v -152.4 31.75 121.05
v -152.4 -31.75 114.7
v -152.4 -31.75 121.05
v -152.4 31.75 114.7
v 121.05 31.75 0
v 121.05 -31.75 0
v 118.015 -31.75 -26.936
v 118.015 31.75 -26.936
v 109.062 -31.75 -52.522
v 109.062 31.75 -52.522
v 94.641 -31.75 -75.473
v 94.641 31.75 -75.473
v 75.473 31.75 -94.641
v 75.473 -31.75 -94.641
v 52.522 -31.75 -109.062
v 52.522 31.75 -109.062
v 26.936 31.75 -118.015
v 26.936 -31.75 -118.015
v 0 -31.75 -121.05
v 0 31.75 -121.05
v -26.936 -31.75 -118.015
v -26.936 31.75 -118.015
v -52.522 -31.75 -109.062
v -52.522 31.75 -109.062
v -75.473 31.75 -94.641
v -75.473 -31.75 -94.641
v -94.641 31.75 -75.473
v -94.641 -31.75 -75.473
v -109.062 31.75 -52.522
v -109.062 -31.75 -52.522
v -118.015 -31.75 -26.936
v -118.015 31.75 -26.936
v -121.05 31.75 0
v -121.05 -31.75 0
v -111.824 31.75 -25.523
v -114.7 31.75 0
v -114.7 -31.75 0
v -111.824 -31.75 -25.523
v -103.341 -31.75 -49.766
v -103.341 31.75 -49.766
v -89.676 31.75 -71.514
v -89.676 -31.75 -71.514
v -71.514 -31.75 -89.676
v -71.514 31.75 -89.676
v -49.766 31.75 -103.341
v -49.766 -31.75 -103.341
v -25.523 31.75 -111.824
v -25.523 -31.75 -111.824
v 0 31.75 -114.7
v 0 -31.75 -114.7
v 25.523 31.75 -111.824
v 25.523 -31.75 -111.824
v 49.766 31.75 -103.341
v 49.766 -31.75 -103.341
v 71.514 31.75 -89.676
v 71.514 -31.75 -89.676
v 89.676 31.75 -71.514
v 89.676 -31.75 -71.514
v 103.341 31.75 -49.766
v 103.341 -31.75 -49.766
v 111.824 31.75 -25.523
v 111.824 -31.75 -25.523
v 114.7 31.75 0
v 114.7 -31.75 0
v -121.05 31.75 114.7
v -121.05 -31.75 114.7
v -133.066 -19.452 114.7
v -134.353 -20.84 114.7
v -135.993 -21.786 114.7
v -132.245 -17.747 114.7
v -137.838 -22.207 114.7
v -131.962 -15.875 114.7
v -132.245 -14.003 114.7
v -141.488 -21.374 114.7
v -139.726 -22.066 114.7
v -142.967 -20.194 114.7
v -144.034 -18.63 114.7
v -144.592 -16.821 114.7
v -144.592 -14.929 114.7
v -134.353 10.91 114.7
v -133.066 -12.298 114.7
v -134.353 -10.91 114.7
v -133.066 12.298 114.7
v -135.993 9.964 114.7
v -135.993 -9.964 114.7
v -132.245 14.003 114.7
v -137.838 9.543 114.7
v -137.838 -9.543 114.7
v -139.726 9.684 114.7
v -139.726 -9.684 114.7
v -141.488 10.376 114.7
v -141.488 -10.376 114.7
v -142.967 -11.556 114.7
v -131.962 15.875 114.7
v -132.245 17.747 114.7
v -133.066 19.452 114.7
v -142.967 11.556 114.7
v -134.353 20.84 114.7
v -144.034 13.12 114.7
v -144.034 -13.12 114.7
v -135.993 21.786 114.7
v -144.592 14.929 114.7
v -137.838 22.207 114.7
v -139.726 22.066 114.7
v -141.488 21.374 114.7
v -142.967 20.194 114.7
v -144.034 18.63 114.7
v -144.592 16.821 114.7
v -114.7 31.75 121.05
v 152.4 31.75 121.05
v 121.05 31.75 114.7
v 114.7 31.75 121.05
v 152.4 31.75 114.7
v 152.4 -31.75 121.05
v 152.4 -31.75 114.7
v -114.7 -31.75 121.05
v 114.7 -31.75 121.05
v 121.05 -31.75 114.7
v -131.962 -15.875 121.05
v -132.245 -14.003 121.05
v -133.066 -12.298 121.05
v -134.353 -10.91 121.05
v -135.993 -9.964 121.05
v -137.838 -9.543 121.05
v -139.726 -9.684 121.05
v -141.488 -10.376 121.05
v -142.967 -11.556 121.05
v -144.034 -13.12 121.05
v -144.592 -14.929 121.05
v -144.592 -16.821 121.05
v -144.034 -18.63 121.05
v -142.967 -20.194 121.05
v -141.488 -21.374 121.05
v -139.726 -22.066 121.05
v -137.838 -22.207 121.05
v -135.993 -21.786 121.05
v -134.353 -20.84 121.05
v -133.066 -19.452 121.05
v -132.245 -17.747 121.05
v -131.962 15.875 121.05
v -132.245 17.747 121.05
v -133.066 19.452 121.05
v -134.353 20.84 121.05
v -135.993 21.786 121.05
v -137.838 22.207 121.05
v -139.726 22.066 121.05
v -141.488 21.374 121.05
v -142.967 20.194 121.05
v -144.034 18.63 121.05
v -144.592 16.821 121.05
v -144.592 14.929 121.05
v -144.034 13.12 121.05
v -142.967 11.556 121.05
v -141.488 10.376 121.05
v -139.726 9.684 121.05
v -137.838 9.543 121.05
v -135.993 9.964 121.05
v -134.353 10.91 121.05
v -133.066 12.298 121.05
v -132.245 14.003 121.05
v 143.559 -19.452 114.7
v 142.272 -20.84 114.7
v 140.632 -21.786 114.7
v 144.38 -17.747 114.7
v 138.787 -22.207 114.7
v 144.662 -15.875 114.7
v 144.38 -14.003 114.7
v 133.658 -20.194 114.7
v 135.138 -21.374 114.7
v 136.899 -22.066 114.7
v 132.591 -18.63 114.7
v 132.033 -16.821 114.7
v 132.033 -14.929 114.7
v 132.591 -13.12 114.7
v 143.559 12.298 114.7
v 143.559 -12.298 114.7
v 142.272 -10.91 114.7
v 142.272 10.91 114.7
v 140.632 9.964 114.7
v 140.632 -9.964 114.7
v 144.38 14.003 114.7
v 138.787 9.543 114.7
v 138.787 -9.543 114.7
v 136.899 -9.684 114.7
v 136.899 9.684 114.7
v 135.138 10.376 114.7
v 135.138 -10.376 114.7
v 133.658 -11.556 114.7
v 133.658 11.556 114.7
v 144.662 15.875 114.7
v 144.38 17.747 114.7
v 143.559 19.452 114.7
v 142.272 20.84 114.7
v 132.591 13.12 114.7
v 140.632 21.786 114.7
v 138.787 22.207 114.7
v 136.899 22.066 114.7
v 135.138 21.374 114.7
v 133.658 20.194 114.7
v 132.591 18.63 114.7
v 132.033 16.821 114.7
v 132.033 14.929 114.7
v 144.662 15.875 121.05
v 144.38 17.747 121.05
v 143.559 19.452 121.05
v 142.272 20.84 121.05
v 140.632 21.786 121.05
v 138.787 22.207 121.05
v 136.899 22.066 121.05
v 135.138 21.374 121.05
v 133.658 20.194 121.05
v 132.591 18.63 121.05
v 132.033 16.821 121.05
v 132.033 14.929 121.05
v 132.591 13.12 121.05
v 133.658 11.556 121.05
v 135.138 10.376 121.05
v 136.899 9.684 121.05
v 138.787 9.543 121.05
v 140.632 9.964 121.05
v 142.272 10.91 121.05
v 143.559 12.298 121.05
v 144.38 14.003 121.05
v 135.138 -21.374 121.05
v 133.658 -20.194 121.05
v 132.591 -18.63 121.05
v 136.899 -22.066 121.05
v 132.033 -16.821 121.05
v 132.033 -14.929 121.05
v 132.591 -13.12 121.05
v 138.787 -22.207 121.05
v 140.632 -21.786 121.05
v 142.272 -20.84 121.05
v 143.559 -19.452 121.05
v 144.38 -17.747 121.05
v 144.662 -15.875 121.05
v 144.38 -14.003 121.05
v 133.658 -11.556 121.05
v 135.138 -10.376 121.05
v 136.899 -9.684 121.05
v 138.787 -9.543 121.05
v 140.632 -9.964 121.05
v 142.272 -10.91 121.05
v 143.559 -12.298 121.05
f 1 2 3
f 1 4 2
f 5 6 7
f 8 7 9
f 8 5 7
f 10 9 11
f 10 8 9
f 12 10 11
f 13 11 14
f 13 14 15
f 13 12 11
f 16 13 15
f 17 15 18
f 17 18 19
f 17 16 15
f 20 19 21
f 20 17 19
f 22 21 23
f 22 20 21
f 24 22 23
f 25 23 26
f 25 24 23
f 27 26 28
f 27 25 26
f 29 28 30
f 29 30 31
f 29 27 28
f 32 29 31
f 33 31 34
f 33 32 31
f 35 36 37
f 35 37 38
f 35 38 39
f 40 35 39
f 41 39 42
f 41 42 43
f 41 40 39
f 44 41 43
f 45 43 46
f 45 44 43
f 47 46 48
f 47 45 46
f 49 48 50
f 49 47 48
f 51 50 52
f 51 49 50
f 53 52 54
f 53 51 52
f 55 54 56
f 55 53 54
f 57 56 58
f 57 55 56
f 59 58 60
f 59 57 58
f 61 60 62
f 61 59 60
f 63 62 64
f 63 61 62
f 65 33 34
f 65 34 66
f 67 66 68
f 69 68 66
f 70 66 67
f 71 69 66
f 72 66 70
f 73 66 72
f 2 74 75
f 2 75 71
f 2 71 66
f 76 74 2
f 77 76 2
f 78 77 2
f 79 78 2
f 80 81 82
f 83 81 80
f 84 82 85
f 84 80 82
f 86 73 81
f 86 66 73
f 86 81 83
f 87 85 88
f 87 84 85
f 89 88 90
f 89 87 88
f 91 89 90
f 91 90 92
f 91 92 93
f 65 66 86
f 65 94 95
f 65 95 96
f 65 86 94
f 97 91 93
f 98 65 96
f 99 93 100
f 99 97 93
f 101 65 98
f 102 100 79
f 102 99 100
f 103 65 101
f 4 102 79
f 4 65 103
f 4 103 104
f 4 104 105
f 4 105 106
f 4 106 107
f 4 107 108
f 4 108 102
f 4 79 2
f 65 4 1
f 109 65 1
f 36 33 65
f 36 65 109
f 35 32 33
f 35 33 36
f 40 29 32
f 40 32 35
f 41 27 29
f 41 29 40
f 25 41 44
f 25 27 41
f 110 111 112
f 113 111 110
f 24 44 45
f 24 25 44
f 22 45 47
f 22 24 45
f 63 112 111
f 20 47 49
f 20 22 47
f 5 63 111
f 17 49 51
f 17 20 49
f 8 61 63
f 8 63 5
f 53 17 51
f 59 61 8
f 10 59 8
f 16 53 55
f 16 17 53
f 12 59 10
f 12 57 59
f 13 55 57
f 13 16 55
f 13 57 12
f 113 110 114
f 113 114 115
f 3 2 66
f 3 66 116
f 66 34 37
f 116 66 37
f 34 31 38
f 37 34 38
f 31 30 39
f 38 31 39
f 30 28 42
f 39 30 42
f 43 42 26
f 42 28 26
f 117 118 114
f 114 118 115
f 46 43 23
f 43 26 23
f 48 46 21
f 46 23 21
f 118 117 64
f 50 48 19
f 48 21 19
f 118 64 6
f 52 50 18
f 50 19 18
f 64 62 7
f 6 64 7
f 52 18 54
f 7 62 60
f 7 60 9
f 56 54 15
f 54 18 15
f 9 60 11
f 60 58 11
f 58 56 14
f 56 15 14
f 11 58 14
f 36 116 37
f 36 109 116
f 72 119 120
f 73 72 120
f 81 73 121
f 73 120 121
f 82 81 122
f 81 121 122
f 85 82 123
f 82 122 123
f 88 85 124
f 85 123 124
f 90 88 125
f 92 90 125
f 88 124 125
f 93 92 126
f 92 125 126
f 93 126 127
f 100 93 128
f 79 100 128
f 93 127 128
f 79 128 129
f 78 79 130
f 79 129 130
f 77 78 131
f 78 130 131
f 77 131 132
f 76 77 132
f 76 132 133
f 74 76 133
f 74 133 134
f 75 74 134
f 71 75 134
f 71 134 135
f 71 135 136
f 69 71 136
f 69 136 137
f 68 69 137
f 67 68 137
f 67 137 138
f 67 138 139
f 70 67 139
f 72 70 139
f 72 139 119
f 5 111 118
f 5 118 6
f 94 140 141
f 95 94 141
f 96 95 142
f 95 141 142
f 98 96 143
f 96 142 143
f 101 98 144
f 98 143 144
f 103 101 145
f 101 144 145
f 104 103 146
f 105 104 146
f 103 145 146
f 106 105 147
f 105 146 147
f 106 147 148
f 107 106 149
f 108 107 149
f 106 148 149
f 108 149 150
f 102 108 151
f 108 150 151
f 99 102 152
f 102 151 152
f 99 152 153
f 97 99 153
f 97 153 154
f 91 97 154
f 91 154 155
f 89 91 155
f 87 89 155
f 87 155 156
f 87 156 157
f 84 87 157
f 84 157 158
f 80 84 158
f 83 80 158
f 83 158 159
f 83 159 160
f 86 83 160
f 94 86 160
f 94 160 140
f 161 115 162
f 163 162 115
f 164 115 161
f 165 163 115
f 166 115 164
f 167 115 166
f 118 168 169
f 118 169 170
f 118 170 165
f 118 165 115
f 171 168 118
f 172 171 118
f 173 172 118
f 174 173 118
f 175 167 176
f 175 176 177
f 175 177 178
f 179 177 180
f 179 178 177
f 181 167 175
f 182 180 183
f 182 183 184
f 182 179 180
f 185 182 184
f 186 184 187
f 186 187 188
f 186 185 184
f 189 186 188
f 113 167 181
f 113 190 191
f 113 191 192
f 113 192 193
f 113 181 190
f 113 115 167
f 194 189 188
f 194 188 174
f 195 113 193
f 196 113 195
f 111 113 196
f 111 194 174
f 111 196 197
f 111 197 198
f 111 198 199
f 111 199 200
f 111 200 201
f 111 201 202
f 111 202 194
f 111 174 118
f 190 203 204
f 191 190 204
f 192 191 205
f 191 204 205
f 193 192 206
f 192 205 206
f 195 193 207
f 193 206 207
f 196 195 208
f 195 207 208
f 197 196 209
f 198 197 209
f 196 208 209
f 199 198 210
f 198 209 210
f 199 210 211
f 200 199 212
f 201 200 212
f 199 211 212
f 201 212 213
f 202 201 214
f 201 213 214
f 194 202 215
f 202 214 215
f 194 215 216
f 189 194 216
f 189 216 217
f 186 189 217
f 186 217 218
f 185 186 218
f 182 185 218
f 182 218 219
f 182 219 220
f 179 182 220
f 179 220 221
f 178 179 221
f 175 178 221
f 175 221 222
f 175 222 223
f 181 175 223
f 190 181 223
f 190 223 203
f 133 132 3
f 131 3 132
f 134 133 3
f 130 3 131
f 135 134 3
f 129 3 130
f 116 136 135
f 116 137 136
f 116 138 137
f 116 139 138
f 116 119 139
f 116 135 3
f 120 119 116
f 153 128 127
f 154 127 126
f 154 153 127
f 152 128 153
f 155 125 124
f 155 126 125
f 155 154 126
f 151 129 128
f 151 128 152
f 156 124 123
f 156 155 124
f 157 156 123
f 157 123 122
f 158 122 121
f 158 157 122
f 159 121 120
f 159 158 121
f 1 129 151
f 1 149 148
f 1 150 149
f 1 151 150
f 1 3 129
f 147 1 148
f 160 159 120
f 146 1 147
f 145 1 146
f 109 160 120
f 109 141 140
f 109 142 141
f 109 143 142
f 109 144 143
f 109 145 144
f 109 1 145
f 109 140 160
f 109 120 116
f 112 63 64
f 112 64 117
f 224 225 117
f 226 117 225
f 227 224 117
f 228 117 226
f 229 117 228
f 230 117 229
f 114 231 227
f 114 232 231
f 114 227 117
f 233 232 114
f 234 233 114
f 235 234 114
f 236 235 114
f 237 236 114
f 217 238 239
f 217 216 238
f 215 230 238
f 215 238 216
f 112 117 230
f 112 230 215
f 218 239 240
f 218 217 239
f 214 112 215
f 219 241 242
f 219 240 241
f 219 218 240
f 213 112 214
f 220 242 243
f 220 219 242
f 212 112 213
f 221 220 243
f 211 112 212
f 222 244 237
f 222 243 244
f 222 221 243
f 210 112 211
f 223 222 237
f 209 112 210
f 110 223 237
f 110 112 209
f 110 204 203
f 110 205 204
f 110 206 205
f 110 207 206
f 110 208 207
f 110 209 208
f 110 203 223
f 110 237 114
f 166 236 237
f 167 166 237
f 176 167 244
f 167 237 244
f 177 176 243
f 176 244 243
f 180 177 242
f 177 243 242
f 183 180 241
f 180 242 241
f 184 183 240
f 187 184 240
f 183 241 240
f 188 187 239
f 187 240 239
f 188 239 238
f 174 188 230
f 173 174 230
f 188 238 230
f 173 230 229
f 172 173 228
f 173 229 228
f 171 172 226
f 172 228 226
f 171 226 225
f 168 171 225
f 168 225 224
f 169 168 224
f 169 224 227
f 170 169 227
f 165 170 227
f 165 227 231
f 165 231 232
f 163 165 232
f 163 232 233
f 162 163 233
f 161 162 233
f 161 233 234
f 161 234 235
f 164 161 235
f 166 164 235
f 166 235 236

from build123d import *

# Parameters (mm, degrees)
BOSS_EXTRUDE1_DEPTH = 31.75
SKETCH15_R          = 6.35
CUT_EXTRUDE1_DEPTH  = 288.83021471


with BuildPart() as part:
    # Sketch1 → Boss-Extrude1 (new, symmetric)
    with BuildSketch(Plane(origin=(0, 0, 0), x_dir=(1, 0, 0), z_dir=(0, 1, 0))):
        with BuildLine():
            Line((-114.7, -121.05), (-114.7, 0))
            ThreePointArc((-114.7, 0), (0, 114.7), (114.7, 0))
            Line((114.7, 0), (114.7, -121.05))
            Line((114.7, -121.05), (152.4, -121.05))
            Line((152.4, -121.05), (152.4, -114.7))
            Line((152.4, -114.7), (121.05, -114.7))
            Line((121.05, -114.7), (121.05, 0))
            ThreePointArc((121.05, 0), (0, 121.05), (-121.05, 0))
            Line((-121.05, 0), (-121.05, -12.7))
            Line((-121.05, -12.7), (-121.05, -114.7))
            Line((-121.05, -114.7), (-152.4, -114.7))
            Line((-152.4, -114.7), (-152.4, -121.05))
            Line((-152.4, -121.05), (-114.7, -121.05))
        make_face()
    extrude(amount=BOSS_EXTRUDE1_DEPTH, both=True)

    # Sketch15 → Cut-Extrude1 (cut, through all)
    with BuildSketch(Plane.XY.offset(121.05)):
        with Locations((-138.3125, 15.875)):
            Circle(SKETCH15_R)
        with Locations((-138.3125, -15.875)):
            Circle(SKETCH15_R)
        with Locations((138.3125, -15.875)):
            Circle(SKETCH15_R)
        with Locations((138.3125, 15.875)):
            Circle(SKETCH15_R)
    extrude(amount=-CUT_EXTRUDE1_DEPTH, mode=Mode.SUBTRACT)


solid = part.part
